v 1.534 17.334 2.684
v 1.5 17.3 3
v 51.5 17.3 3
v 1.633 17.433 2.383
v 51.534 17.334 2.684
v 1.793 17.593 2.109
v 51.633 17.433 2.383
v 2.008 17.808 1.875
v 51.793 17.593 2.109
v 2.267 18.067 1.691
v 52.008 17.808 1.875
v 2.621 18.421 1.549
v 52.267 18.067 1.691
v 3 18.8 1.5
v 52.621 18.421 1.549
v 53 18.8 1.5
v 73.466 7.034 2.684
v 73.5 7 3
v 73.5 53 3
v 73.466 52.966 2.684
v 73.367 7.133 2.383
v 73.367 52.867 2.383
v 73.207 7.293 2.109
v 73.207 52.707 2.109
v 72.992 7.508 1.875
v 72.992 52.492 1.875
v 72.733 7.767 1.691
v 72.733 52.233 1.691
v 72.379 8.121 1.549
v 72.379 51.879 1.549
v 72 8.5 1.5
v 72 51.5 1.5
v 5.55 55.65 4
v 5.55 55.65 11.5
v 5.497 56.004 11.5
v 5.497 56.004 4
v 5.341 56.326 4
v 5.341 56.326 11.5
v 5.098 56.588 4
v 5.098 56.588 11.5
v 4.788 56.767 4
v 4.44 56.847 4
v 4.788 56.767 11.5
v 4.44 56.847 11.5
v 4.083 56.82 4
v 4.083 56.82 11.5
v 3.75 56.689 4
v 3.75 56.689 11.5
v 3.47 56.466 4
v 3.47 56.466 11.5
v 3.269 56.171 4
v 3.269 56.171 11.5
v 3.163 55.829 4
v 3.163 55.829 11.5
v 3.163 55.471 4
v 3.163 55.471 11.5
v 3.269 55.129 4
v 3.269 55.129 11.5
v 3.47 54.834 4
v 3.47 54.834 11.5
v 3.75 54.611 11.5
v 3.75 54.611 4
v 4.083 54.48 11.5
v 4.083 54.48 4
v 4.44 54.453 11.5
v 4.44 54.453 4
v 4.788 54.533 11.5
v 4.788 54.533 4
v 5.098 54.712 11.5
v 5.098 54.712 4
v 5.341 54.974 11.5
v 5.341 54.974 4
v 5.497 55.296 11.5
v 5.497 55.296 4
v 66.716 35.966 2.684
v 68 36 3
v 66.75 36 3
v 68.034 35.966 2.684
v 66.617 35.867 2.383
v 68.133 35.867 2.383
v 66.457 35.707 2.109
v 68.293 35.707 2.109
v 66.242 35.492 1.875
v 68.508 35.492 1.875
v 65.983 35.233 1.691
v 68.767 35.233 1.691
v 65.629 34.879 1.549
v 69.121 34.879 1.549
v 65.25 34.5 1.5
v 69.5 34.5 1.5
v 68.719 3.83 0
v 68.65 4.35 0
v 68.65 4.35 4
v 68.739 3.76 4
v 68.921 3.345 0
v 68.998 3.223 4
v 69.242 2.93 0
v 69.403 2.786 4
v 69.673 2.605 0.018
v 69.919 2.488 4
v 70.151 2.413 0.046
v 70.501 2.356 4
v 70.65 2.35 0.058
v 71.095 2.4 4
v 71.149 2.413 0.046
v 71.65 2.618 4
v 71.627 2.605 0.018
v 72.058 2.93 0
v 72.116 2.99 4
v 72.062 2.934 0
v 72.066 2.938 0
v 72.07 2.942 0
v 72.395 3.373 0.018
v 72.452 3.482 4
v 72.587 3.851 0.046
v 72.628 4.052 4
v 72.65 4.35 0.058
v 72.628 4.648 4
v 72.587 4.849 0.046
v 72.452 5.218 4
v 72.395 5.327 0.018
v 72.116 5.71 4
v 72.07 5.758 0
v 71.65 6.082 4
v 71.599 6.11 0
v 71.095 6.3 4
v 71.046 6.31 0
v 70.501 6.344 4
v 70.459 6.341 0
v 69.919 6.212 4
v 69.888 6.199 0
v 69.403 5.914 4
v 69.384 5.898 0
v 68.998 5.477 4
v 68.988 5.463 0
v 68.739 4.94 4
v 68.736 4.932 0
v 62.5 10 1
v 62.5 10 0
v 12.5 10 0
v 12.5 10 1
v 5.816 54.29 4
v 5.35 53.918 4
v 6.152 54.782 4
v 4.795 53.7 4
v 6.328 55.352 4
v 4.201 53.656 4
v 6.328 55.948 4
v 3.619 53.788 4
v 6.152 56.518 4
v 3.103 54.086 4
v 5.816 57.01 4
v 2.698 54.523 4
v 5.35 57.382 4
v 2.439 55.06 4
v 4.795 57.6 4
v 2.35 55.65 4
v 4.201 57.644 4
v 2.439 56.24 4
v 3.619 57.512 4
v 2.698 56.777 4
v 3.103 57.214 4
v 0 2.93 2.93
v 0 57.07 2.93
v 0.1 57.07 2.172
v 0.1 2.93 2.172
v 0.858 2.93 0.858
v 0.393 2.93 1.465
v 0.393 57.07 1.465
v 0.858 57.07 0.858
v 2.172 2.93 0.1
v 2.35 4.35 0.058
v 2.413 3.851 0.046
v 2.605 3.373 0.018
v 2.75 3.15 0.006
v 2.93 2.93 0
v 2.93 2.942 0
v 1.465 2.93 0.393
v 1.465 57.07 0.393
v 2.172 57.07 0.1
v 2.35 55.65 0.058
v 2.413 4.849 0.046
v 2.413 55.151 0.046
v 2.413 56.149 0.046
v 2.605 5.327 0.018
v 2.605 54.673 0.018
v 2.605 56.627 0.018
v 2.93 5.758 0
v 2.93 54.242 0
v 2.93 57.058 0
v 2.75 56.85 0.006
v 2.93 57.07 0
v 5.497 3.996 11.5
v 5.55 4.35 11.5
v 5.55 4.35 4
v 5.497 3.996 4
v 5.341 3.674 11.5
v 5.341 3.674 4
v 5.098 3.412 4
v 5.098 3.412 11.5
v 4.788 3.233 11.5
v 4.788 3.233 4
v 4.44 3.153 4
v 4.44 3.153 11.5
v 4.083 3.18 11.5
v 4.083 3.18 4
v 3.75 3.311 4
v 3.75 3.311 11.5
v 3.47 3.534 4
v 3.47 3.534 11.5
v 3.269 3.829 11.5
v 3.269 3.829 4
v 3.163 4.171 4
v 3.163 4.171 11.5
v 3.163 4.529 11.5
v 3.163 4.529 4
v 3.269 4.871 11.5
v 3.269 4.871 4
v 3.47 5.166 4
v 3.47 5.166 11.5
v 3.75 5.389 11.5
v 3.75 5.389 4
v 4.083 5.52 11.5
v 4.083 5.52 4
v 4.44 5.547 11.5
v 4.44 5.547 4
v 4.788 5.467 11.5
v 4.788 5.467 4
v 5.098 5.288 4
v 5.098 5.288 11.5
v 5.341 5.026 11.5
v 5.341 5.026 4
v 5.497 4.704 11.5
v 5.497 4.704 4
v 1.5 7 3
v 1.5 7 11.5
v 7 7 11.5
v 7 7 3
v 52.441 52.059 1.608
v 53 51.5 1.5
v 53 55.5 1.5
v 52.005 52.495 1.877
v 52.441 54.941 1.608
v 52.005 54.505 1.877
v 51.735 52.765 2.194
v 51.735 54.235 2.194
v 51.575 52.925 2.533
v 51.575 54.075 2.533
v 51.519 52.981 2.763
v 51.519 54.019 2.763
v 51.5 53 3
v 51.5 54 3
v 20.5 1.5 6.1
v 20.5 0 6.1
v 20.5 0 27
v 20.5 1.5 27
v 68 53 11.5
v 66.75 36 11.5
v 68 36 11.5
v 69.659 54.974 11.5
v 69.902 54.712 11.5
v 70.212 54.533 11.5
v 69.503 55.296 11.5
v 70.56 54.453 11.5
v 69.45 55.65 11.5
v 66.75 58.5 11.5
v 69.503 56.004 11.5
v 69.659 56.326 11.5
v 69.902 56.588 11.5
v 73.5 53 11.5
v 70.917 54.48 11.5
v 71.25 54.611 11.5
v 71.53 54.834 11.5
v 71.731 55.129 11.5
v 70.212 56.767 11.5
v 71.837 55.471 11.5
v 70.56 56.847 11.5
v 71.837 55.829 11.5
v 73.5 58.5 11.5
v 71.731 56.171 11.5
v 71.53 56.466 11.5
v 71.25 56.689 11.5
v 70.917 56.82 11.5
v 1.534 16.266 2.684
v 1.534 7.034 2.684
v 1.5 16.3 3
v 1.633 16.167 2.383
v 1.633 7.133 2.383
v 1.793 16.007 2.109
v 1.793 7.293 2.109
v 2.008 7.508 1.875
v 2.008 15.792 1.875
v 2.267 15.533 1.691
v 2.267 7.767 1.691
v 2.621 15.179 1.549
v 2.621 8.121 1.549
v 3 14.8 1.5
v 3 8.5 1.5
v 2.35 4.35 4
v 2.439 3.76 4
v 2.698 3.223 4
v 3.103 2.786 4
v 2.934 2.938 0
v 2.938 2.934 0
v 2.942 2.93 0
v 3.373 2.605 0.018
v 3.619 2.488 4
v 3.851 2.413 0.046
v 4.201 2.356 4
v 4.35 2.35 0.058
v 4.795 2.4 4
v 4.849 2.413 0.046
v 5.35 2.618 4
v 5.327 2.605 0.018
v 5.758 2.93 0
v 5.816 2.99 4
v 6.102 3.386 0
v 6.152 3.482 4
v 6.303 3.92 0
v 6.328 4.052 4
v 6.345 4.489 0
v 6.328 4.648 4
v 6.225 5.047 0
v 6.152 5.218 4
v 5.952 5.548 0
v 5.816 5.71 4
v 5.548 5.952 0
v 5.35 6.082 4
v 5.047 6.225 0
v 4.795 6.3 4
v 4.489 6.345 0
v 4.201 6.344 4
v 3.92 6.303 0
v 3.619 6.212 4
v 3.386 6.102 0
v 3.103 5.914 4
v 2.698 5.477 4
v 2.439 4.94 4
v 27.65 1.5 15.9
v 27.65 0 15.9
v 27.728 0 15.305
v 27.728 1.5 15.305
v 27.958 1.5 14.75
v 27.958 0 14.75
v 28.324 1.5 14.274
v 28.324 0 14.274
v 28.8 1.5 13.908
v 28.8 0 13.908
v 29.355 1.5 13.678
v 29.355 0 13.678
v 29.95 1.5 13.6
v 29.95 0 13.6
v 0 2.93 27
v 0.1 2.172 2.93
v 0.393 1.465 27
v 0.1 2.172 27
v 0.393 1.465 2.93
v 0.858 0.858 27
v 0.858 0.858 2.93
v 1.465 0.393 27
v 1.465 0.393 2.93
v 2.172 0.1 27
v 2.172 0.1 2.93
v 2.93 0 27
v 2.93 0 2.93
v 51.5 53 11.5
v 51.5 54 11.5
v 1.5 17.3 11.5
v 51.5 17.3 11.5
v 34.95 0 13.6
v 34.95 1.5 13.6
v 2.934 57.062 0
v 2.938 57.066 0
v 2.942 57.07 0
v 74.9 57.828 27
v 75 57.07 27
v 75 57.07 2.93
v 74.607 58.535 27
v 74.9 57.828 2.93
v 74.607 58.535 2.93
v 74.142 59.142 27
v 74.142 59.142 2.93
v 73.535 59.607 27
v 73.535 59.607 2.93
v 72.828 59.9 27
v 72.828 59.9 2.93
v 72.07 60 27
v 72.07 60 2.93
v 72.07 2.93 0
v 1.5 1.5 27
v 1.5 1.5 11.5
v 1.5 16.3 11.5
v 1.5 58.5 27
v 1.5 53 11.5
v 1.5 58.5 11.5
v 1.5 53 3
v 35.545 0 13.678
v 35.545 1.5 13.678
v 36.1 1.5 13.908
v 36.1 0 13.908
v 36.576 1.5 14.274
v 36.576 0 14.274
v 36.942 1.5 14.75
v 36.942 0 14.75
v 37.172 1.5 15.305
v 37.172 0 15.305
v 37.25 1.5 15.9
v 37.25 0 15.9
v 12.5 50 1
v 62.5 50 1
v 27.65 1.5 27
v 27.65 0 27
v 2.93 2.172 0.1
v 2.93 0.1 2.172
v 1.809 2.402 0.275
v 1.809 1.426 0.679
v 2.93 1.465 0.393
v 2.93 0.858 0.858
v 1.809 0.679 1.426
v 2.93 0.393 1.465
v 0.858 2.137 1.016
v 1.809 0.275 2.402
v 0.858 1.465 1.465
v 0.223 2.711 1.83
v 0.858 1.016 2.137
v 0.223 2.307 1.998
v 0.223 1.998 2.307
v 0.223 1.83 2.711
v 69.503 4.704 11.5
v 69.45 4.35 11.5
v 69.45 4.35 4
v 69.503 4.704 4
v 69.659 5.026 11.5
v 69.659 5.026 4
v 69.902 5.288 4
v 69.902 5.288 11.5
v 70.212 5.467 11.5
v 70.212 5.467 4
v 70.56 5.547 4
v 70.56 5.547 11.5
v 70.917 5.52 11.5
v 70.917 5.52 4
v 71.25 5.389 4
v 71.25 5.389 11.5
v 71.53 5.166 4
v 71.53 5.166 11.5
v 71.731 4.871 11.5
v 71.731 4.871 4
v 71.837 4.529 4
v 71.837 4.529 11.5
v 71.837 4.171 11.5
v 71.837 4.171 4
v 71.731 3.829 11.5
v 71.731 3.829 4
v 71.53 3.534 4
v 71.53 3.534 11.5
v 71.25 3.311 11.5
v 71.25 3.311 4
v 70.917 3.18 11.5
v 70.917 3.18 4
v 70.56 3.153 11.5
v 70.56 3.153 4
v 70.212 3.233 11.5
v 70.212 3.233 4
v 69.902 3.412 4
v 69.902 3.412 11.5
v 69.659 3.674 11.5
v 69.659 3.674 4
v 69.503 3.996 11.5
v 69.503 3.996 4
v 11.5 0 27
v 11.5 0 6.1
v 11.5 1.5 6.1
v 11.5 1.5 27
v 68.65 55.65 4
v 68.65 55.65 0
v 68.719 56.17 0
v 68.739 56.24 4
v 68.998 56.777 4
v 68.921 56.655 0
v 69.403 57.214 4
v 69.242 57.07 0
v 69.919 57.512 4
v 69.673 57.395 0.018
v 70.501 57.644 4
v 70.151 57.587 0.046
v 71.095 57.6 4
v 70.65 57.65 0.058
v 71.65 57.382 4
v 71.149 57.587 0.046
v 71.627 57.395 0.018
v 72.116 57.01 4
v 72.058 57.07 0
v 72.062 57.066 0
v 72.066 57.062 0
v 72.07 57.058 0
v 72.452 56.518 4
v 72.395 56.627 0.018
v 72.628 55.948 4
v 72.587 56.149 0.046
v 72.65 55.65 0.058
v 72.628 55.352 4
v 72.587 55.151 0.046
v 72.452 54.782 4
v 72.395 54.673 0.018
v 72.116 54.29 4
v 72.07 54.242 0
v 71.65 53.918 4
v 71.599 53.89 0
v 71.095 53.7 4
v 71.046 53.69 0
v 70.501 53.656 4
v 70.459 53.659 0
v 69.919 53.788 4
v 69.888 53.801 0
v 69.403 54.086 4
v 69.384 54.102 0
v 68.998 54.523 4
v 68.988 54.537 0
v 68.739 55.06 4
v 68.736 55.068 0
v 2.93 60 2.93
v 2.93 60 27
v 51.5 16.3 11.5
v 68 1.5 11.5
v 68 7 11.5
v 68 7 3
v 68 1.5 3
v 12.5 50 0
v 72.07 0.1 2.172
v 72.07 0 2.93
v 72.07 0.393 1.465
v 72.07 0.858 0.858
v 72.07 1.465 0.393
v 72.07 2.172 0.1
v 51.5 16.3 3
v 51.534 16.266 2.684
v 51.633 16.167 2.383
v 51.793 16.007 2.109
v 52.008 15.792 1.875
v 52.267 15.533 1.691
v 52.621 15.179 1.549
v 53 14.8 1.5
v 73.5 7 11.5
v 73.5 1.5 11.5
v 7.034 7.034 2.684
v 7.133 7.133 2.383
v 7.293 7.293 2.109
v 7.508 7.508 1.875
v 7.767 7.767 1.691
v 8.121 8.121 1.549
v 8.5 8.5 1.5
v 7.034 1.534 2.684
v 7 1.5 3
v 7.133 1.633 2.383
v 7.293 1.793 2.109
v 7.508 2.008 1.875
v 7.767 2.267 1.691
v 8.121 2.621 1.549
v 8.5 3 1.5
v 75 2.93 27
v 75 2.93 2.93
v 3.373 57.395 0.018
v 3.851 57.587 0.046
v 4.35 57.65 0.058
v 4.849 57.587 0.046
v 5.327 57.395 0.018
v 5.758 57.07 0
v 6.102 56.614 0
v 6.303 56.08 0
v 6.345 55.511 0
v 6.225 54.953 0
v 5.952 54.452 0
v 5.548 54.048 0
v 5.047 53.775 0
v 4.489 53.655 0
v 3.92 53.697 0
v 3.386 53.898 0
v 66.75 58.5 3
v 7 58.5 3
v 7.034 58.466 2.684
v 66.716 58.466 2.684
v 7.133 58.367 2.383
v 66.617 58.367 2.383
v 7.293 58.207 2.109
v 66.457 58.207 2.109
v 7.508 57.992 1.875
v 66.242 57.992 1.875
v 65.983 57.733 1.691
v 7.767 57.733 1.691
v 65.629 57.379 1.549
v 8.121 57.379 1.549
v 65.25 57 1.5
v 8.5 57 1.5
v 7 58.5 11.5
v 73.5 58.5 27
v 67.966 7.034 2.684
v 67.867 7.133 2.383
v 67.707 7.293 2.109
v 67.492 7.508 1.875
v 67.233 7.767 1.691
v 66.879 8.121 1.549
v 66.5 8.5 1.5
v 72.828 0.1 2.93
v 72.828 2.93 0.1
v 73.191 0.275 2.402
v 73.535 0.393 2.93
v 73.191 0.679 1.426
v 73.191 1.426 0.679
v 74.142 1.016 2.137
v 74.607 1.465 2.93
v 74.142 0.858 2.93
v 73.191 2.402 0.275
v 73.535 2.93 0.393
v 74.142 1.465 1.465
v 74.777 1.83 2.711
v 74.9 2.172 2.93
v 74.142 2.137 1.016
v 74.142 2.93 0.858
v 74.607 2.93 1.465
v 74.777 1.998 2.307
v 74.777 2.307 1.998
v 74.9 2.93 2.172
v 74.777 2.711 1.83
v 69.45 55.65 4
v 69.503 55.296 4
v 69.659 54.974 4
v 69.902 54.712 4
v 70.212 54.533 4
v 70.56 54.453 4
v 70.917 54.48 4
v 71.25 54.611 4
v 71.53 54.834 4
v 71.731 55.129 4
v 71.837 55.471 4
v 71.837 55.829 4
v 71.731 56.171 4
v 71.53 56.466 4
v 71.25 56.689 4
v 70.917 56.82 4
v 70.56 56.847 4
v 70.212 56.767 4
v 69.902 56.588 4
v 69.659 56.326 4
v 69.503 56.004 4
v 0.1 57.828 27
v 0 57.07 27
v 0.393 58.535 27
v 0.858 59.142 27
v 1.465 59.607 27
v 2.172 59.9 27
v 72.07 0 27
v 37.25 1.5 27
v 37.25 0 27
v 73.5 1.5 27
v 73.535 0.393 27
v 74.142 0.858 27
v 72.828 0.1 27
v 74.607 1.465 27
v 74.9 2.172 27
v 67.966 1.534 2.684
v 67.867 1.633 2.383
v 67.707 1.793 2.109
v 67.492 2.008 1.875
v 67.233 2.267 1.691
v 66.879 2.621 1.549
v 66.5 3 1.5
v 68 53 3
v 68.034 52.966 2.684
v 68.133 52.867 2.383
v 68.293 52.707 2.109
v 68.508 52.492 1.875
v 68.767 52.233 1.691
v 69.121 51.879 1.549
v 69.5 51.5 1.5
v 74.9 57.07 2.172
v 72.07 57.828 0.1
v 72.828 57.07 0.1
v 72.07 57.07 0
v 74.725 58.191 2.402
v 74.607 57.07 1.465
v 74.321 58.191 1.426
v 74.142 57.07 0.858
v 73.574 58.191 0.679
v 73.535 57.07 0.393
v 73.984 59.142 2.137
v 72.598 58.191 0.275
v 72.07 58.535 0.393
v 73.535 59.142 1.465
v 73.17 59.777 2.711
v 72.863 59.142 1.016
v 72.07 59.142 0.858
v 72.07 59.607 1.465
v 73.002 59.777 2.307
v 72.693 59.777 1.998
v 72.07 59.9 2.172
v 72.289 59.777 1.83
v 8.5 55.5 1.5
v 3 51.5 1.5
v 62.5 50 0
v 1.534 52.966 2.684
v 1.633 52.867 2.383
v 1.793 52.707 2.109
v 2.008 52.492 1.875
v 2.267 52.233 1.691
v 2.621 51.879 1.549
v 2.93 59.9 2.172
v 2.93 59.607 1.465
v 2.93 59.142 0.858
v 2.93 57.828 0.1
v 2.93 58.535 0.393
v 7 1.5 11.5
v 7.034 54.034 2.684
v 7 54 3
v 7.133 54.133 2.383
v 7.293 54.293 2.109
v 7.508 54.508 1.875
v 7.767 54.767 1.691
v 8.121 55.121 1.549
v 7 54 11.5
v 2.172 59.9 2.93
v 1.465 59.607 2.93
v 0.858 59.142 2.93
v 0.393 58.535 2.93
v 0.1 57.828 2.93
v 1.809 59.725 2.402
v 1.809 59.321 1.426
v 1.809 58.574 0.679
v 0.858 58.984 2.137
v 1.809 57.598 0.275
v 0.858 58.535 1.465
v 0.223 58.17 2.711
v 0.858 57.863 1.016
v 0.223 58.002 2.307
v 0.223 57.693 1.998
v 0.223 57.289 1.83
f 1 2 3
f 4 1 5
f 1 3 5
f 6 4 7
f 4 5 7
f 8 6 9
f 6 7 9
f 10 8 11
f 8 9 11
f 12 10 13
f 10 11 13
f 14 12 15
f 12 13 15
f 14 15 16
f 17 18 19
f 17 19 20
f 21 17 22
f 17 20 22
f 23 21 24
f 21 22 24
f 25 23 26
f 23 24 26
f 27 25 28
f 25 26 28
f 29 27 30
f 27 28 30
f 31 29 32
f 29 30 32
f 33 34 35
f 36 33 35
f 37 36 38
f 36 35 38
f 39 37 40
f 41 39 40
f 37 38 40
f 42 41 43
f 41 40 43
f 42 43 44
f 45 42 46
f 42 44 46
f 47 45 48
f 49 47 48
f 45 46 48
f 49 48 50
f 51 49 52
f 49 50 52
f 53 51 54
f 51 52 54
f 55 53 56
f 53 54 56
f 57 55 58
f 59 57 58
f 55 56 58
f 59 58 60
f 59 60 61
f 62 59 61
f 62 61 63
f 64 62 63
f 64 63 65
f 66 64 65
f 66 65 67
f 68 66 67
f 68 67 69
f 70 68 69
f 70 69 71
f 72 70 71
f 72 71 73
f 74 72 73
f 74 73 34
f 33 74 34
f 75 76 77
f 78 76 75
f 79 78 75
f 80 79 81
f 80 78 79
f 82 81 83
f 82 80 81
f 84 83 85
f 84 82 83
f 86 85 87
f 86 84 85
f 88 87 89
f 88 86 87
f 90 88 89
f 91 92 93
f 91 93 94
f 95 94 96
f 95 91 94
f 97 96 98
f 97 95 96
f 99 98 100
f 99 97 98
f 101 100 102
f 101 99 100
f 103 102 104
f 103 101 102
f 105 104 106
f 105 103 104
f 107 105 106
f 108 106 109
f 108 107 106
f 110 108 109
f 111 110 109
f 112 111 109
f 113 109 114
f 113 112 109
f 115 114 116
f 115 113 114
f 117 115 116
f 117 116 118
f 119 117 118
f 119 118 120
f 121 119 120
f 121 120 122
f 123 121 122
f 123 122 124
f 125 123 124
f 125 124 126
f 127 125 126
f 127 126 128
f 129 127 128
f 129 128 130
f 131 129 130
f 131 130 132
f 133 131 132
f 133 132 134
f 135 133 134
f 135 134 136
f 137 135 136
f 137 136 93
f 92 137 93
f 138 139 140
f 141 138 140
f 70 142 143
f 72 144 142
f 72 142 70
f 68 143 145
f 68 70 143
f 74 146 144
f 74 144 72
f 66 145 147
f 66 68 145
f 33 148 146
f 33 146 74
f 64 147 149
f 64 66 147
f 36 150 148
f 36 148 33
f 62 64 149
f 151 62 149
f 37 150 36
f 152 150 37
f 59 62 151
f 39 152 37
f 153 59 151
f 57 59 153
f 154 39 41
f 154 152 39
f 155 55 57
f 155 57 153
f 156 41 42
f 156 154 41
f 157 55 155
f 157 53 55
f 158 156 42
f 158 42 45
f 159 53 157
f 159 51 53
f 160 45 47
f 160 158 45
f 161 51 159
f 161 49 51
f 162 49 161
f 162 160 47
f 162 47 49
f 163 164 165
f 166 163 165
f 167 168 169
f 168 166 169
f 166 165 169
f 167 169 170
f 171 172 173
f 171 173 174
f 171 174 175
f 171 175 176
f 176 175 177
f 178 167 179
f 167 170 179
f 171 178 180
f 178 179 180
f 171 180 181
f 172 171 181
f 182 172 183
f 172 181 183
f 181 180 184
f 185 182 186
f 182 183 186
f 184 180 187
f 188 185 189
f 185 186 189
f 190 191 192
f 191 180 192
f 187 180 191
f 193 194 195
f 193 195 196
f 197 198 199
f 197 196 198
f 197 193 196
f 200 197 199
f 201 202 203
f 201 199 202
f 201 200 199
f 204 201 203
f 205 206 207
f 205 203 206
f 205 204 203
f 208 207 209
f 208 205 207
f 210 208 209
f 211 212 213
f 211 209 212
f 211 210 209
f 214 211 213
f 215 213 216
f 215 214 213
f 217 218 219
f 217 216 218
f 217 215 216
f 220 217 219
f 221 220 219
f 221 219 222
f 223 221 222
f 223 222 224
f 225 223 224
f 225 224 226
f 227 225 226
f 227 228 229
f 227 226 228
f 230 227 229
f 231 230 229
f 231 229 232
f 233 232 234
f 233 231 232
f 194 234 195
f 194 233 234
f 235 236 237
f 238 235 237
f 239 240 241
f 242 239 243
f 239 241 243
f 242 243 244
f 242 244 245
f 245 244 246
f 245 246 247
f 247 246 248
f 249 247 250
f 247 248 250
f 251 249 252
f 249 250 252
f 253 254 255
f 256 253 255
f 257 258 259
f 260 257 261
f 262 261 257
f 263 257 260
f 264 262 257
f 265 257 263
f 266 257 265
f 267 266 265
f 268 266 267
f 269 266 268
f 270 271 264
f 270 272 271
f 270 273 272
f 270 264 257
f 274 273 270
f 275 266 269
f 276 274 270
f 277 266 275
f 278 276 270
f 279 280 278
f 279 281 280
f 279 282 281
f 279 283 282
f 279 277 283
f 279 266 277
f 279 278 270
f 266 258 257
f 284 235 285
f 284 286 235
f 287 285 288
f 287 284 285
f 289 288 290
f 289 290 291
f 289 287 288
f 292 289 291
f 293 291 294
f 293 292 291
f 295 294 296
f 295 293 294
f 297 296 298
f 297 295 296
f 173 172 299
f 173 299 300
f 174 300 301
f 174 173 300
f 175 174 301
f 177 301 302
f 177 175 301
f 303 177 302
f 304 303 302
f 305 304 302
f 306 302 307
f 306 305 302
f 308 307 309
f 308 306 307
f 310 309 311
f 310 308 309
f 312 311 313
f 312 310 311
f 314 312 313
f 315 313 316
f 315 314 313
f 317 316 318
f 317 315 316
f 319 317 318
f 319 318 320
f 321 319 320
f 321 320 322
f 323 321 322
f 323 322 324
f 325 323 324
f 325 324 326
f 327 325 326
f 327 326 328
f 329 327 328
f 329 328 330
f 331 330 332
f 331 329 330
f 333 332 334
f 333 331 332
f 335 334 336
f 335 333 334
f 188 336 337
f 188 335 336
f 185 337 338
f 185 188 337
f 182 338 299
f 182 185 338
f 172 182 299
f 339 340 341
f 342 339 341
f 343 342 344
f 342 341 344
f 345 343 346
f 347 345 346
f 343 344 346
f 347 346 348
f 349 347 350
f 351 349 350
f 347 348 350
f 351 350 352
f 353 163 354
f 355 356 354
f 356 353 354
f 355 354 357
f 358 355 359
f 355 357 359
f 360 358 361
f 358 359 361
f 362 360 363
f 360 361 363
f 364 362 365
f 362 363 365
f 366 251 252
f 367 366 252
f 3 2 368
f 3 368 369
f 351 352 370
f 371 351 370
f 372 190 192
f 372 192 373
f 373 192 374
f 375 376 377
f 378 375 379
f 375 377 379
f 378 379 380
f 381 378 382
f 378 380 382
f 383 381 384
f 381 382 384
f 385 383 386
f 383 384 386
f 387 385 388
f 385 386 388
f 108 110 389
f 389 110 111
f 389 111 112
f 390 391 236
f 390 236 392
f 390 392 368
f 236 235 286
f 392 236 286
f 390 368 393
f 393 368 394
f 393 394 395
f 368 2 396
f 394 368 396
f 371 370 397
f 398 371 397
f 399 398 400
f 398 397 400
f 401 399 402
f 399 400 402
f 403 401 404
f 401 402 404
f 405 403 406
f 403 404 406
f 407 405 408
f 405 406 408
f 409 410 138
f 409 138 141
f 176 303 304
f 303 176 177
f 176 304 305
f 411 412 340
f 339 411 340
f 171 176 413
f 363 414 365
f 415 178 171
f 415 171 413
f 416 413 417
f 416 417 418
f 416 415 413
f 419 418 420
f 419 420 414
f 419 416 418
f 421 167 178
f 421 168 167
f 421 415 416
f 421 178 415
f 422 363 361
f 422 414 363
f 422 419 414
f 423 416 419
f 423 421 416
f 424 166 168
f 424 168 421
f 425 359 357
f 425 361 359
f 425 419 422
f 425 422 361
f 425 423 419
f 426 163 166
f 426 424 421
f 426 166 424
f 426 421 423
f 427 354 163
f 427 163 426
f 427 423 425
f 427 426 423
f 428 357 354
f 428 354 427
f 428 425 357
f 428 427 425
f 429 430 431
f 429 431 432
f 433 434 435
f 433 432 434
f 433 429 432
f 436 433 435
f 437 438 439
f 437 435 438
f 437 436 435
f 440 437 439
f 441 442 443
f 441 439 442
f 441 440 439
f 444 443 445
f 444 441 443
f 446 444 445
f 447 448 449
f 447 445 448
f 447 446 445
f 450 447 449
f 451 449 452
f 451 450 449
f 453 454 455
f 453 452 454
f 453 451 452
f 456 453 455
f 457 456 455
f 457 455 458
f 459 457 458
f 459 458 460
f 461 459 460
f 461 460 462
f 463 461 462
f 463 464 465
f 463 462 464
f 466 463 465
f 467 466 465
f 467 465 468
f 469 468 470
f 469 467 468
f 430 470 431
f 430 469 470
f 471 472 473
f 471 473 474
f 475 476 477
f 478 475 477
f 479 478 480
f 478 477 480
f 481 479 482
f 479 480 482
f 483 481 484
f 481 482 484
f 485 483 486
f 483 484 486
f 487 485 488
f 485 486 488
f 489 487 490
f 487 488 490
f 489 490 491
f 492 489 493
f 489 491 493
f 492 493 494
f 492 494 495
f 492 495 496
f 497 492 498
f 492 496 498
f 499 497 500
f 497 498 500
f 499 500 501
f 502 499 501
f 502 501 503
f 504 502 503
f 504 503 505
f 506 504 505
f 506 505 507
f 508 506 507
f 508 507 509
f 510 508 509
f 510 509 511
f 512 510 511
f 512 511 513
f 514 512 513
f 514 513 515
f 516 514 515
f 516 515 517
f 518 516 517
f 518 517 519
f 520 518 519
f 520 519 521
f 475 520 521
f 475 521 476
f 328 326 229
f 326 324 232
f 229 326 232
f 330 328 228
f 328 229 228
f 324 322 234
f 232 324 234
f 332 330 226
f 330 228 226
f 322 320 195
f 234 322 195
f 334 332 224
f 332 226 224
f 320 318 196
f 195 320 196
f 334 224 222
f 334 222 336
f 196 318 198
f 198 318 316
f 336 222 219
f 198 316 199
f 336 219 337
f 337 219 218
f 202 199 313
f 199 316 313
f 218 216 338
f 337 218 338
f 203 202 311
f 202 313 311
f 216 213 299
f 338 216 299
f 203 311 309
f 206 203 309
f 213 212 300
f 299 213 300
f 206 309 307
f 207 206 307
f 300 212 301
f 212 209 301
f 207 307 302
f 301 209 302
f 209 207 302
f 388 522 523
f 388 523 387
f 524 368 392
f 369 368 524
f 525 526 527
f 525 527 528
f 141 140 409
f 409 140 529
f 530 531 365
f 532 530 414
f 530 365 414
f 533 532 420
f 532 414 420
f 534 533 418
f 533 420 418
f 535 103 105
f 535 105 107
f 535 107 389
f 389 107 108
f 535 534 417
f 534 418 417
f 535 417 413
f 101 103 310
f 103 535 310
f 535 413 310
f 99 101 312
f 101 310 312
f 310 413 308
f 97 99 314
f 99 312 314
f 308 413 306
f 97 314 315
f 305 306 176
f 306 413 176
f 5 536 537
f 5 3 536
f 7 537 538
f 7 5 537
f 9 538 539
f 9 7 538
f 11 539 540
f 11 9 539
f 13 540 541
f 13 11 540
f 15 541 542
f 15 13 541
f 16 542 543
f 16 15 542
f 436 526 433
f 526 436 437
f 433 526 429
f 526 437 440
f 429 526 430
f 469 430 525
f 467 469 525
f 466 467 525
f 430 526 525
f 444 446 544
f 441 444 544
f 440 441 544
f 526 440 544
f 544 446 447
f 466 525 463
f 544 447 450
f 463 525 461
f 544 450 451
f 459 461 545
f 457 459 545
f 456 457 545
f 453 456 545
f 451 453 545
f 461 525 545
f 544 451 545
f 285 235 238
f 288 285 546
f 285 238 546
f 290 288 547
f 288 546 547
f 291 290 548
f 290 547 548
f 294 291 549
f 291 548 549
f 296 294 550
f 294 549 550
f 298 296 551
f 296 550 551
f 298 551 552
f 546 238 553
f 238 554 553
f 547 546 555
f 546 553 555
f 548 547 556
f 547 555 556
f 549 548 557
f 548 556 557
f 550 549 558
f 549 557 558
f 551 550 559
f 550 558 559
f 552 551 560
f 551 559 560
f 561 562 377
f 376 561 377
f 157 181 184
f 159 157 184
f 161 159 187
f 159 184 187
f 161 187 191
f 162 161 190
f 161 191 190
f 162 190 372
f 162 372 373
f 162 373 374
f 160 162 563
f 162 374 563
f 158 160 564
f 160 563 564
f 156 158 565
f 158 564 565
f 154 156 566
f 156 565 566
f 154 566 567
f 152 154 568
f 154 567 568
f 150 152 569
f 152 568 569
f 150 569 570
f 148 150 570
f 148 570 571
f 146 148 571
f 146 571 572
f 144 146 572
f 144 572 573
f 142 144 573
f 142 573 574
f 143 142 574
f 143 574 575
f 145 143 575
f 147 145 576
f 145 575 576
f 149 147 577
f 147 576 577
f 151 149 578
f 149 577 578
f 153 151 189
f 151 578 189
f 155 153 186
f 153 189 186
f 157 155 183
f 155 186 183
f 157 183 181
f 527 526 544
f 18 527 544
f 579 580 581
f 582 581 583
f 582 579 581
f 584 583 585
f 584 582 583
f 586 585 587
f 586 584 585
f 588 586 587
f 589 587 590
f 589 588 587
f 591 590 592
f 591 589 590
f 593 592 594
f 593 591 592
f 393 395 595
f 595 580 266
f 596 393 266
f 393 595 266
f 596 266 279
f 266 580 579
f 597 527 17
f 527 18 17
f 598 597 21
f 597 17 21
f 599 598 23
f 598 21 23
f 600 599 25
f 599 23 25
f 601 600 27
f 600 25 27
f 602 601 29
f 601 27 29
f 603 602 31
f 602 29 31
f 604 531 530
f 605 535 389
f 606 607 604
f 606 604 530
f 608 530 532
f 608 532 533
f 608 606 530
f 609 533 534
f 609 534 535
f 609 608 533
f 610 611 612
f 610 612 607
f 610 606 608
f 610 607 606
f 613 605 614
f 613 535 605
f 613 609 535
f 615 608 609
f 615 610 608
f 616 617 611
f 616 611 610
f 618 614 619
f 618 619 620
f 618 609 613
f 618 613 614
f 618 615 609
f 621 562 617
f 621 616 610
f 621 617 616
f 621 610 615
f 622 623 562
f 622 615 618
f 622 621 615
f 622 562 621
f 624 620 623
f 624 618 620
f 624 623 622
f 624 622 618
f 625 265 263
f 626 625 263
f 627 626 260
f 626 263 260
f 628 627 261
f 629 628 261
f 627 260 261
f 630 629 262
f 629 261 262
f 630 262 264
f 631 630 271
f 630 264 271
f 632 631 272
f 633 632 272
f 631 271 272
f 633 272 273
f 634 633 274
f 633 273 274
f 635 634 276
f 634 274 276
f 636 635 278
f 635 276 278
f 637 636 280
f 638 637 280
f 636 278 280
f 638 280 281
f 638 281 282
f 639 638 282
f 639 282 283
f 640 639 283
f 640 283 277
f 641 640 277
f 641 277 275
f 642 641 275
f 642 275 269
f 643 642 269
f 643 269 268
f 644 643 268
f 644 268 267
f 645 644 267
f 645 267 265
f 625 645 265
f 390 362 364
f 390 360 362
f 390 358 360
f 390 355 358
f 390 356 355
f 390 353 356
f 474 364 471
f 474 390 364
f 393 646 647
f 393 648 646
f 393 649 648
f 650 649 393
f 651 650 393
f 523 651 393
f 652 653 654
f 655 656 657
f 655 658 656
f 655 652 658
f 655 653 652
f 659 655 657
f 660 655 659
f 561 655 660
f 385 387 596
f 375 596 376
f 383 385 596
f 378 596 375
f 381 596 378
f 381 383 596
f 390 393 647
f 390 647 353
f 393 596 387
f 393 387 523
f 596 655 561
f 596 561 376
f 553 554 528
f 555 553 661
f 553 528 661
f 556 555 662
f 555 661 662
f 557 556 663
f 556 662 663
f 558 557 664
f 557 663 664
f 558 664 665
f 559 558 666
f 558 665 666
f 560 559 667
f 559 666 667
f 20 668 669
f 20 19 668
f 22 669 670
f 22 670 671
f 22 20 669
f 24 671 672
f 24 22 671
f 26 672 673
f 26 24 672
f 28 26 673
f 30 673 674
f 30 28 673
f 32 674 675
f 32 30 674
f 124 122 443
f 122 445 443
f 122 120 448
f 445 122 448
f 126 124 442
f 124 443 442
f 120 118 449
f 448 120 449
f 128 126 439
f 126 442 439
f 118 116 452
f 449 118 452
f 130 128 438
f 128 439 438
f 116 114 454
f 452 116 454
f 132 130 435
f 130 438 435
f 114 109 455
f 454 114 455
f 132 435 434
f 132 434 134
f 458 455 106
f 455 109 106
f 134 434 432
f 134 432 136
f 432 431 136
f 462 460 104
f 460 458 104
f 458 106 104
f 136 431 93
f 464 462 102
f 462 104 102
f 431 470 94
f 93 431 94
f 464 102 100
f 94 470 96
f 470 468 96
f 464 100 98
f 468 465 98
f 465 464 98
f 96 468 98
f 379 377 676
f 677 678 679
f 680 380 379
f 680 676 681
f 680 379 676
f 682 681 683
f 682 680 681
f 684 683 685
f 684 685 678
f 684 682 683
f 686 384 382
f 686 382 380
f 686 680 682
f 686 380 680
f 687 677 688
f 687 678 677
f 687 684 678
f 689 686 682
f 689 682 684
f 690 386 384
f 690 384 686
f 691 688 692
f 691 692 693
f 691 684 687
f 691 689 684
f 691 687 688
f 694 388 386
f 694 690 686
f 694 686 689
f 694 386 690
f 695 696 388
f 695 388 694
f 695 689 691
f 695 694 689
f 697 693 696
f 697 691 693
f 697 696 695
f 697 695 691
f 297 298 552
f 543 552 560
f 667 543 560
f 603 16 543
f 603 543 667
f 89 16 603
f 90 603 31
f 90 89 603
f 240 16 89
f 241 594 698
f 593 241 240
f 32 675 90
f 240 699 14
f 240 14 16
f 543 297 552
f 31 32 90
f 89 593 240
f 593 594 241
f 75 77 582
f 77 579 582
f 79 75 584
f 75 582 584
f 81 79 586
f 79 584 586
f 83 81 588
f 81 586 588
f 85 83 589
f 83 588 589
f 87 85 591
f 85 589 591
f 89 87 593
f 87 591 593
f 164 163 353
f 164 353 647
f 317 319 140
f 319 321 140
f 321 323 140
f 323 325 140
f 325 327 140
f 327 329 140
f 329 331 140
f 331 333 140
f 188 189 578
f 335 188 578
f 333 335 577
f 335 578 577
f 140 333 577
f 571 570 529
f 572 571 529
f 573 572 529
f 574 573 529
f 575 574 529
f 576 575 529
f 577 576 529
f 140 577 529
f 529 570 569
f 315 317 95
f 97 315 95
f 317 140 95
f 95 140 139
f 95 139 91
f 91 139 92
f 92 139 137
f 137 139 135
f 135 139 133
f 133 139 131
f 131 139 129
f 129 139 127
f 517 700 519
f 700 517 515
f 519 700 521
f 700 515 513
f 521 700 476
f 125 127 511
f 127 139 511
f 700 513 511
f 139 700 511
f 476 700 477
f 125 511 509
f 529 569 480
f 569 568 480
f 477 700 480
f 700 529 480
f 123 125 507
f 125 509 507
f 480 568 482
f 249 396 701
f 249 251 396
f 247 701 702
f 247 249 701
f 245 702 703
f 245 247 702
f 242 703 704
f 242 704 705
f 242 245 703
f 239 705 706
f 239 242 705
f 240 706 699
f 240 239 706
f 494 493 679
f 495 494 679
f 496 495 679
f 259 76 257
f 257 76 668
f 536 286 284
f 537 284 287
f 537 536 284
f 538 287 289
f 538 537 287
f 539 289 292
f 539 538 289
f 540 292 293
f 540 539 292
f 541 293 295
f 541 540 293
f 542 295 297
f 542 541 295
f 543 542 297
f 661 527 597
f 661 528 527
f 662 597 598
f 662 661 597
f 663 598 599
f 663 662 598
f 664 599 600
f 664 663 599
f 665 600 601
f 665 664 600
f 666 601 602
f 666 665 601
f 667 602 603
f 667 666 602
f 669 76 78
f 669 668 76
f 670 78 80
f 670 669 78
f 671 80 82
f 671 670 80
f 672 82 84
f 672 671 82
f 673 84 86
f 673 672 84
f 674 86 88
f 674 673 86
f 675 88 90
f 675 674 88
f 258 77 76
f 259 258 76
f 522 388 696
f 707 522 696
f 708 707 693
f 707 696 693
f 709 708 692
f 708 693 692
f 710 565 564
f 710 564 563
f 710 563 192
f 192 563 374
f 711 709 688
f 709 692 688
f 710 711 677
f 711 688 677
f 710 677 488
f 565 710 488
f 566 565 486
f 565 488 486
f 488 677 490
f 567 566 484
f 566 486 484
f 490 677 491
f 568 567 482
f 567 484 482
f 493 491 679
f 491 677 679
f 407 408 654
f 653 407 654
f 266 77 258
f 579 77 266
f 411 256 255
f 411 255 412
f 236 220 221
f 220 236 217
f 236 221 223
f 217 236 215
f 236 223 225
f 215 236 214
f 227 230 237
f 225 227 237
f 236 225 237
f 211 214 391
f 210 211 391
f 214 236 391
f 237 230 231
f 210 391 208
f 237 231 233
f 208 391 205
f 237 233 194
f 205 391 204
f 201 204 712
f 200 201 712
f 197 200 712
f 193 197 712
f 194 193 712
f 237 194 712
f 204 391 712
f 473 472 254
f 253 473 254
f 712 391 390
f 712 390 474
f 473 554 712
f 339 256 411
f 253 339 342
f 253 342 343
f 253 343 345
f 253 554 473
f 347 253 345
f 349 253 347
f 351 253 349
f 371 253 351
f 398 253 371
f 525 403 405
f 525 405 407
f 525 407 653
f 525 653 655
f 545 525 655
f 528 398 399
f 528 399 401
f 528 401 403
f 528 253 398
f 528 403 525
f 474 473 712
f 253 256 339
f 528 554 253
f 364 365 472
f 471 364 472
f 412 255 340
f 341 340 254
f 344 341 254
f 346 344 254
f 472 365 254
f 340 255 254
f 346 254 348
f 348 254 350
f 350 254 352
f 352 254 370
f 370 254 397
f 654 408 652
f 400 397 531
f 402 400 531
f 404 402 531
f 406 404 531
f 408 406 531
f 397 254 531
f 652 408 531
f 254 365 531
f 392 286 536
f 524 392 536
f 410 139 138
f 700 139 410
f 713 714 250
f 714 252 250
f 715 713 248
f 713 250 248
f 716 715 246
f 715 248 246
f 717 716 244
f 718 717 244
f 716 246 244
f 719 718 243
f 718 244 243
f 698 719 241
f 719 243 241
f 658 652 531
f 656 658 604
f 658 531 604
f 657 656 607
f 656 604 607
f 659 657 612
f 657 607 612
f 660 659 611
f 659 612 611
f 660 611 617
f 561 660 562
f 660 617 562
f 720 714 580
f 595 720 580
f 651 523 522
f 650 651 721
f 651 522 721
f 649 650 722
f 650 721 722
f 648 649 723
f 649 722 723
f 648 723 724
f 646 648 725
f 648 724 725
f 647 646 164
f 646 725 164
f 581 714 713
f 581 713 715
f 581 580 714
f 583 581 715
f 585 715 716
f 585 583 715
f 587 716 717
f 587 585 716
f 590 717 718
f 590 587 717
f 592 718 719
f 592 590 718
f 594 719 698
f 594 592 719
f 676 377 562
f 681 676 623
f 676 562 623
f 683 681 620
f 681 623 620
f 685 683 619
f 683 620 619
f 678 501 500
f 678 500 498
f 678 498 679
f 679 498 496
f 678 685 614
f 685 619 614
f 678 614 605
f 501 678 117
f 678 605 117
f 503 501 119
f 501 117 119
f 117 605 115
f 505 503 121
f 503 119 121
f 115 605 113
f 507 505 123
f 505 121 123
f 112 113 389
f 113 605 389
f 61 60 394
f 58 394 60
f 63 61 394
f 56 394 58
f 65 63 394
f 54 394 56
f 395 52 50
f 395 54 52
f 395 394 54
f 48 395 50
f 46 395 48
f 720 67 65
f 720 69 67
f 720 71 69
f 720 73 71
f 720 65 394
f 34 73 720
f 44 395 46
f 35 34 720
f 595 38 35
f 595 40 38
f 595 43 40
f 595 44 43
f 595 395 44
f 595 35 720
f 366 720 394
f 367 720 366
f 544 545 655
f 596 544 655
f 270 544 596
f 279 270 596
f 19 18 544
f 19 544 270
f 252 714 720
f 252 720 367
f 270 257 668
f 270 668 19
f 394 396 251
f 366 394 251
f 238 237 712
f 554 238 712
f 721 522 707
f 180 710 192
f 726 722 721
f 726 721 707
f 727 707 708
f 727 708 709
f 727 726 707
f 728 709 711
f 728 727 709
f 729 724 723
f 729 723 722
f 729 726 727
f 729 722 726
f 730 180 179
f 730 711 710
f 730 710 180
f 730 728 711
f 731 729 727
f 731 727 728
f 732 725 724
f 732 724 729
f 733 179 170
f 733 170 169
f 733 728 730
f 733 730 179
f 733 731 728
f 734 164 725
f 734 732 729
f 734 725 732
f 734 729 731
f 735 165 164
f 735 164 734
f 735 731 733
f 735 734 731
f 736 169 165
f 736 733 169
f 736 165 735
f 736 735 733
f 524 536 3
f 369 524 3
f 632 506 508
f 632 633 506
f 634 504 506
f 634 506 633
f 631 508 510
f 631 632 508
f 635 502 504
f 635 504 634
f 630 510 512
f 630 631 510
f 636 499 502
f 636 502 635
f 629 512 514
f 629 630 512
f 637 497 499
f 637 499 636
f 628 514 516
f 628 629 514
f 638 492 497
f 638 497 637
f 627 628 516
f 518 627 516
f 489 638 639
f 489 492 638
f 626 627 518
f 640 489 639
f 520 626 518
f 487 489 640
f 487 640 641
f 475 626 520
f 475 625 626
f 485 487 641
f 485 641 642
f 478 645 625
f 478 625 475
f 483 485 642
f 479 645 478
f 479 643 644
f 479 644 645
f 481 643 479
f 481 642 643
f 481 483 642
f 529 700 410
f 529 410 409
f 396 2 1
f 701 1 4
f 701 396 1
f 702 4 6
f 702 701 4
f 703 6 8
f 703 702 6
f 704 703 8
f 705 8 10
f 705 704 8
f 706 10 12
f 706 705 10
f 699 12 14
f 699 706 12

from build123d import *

# Parameters (mm, degrees)
SKETCH2_W               = 75
SKETCH2_H               = 60
BODY_CREATION_DEPTH     = 27
THIKNESS_OF_WALLS_T     = -1.5
SKETCH6_W               = 5.5
SKETCH6_H               = 5.5
CORNER_RECT_DEPTH       = 10
SKETCH8_R               = 1.2
SCREW_HOLE_DEPTH        = 27
SKETCH10_R              = 2
SCREW_HEAD_DEPTH        = 4
SKETCH5_W               = 9
SKETCH5_H               = 20.9
PORTS_CUT_OUT_DEPTH     = 1.5
SKETCH11_W              = 44.5
SKETCH11_H              = 1
SKETCH11_W_2            = 50
SKETCH11_W_3            = 1.25
SKETCH11_H_2            = 22.5
BATTERY_PLACEMENT_DEPTH = 10
FILLET1_R               = 1.5
FILLET2_R               = 2.93
SKETCH13_W              = 50
SKETCH13_H              = 40
CUT_EXTRUDE1_DEPTH      = 1


with BuildPart() as part:
    # Sketch2 → Body creation (new body)
    with BuildSketch(Plane.XY):
        with Locations((37.5, 30)):
            Rectangle(SKETCH2_W, SKETCH2_H)
    extrude(amount=BODY_CREATION_DEPTH)

    # Thikness of walls
    thikness_of_walls_openings = [part.faces().sort_by_distance(p)[0] for p in [
        (37.5, 30, 27),
    ]]
    offset(amount=THIKNESS_OF_WALLS_T, openings=thikness_of_walls_openings, kind=Kind.INTERSECTION)

    # Sketch6 → Corner rect. (add)
    with BuildSketch(Plane.XY.offset(1.5)):
        with Locations((4.25, 55.75)):
            Rectangle(SKETCH6_W, SKETCH6_H)
        with Locations((70.75, 55.75)):
            Rectangle(SKETCH6_W, SKETCH6_H)
    corner_rect = extrude(amount=CORNER_RECT_DEPTH)

    # Sketch8 → Screw hole (cut)
    with BuildSketch(Plane.XY.offset(27)):
        with Locations((4.35, 55.65)):
            Circle(SKETCH8_R)
        with Locations(Location((70.65, 55.65, 0), (0, 0, 180))):
            Circle(SKETCH8_R)
    screw_hole = extrude(amount=-SCREW_HOLE_DEPTH, mode=Mode.SUBTRACT)

    # Sketch10 → Screw head (cut)
    with BuildSketch(Plane(origin=(0, 0, 0), x_dir=(-1, 0, 0), z_dir=(0, 0, -1))):
        with Locations((-70.65, 55.65)):
            Circle(SKETCH10_R)
        with Locations((-4.35, 55.65)):
            Circle(SKETCH10_R)
    screw_head = extrude(amount=-SCREW_HEAD_DEPTH, mode=Mode.SUBTRACT)

    # Mirror to other side: Corner rect., Screw hole, Screw head across plane
    add(corner_rect.mirror(Plane(origin=(0, 30, 0), x_dir=(0, 0, 1), z_dir=(0, -1, 0))))
    add(screw_hole.mirror(Plane(origin=(0, 30, 0), x_dir=(0, 0, 1), z_dir=(0, -1, 0))), mode=Mode.SUBTRACT)
    add(screw_head.mirror(Plane(origin=(0, 30, 0), x_dir=(0, 0, 1), z_dir=(0, -1, 0))), mode=Mode.SUBTRACT)

    # Sketch5 → Ports cut out (cut)
    with BuildSketch(Plane.XZ):
        with Locations((16, 16.55)):
            Rectangle(SKETCH5_W, SKETCH5_H)
        with BuildLine():
            Line((29.95, 13.6), (34.95, 13.6))
            ThreePointArc((34.95, 13.6), (36.576345597, 14.273654403), (37.25, 15.9))
            Line((37.25, 15.9), (37.25, 27))
            Line((37.25, 27), (27.65, 27))
            Line((27.65, 27), (27.65, 15.9))
            ThreePointArc((27.65, 15.9), (28.323654403, 14.273654403), (29.95, 13.6))
        make_face()
    extrude(amount=-PORTS_CUT_OUT_DEPTH, mode=Mode.SUBTRACT)

    # Sketch11 → Battery Placement (add)
    with BuildSketch(Plane.XY.offset(1.5)):
        with Locations((29.25, 53.5)):
            Rectangle(SKETCH11_W, SKETCH11_H)
        with Locations((26.5, 16.8)):
            Rectangle(SKETCH11_W_2, SKETCH11_H)
        with Locations((67.375, 47.25)):
            Rectangle(SKETCH11_W_3, SKETCH11_H_2)
    extrude(amount=BATTERY_PLACEMENT_DEPTH)

    # Fillet1
    fillet1_edges = [part.edges().sort_by_distance(p)[0] for p in [
        (7, 56.25, 1.5),
        (51.5, 53.5, 1.5),
        (29.25, 54, 1.5),
        (1.5, 11.65, 1.5),
        (51.5, 16.8, 1.5),
        (26.5, 17.3, 1.5),
        (26.5, 16.3, 1.5),
        (36.875, 58.5, 1.5),
        (68, 44.5, 1.5),
        (66.75, 47.25, 1.5),
        (67.375, 36, 1.5),
        (1.5, 35.15, 1.5),
        (26.5, 53, 1.5),
        (70.75, 53, 1.5),
        (37.5, 1.5, 1.5),
        (4.25, 7, 1.5),
        (7, 4.25, 1.5),
        (73.5, 30, 1.5),
        (68, 4.25, 1.5),
        (70.75, 7, 1.5),
    ]]
    fillet(fillet1_edges, radius=FILLET1_R)

    # Fillet2
    # the kernel refuses this fillet: 2.93 mm, written as the material it takes off along each edge
    with BuildSketch(Plane(origin=(72.07, 57.07, 2.93), x_dir=(1, 0, 0), z_dir=(0, 1, 0))) as fillet2_piece_1_section:
        Polygon((0, 0), (FILLET2_R, 0), (FILLET2_R, FILLET2_R), (0, FILLET2_R), align=None)
    fillet2_piece_1 = extrude(amount=FILLET2_R, mode=Mode.PRIVATE)
    fillet2_piece_1 = fillet2_piece_1 - Plane(origin=(72.07, 57.07, 2.93), x_dir=(-0.7071067811865475, 0, 0.7071067811865475), z_dir=(0, 1, 0)) * Sphere(FILLET2_R, mode=Mode.PRIVATE)
    add(fillet2_piece_1, mode=Mode.SUBTRACT)
    with BuildSketch(Plane(origin=(2.93, 57.07, 2.93), x_dir=(0, 1, 0), z_dir=(-1, 0, 0))) as fillet2_piece_2_section:
        Polygon((0, 0), (FILLET2_R, 0), (FILLET2_R, FILLET2_R), (0, FILLET2_R), align=None)
    fillet2_piece_2 = extrude(amount=FILLET2_R, mode=Mode.PRIVATE)
    fillet2_piece_2 = fillet2_piece_2 - Plane(origin=(2.93, 57.07, 2.93), x_dir=(0, -0.7071067811865475, 0.7071067811865475), z_dir=(-1, 0, 0)) * Sphere(FILLET2_R, mode=Mode.PRIVATE)
    add(fillet2_piece_2, mode=Mode.SUBTRACT)
    with BuildSketch(Plane(origin=(72.07, 2.93, 2.93), x_dir=(0, -1, 0), z_dir=(1, 0, 0))) as fillet2_piece_3_section:
        Polygon((0, 0), (FILLET2_R, 0), (FILLET2_R, FILLET2_R), (0, FILLET2_R), align=None)
    fillet2_piece_3 = extrude(amount=FILLET2_R, mode=Mode.PRIVATE)
    fillet2_piece_3 = fillet2_piece_3 - Plane(origin=(72.07, 2.93, 2.93), x_dir=(0, 0.7071067811865475, 0.7071067811865475), z_dir=(1, 0, 0)) * Sphere(FILLET2_R, mode=Mode.PRIVATE)
    add(fillet2_piece_3, mode=Mode.SUBTRACT)
    with BuildSketch(Plane(origin=(2.93, 2.93, 2.93), x_dir=(0, -1, 0), z_dir=(-1, 0, 0))) as fillet2_piece_4_section:
        Polygon((0, 0), (FILLET2_R, 0), (FILLET2_R, -FILLET2_R), (0, -FILLET2_R), align=None)
    fillet2_piece_4 = extrude(amount=FILLET2_R, mode=Mode.PRIVATE)
    fillet2_piece_4 = fillet2_piece_4 - Plane(origin=(2.93, 2.93, 2.93), x_dir=(0, 0.7071067811865475, 0.7071067811865475), z_dir=(-1, 0, 0)) * Sphere(FILLET2_R, mode=Mode.PRIVATE)
    add(fillet2_piece_4, mode=Mode.SUBTRACT)
    with BuildSketch(Plane(origin=(72.07, 60, 0), x_dir=(0, 0, 1), z_dir=(-1, 0, 0)), Plane(origin=(2.93, 0, 0), x_dir=(0, 0, 1), z_dir=(1, 0, 0))) as fillet2_piece_5:
        with BuildLine():
            CenterArc((FILLET2_R, -FILLET2_R), FILLET2_R, 90, 90)
            Line((0, -FILLET2_R), (0, 0))
            Line((0, 0), (FILLET2_R, 0))
        make_face()
    extrude(amount=69.14, mode=Mode.SUBTRACT)
    with BuildSketch(Plane(origin=(75, 2.93, 0), x_dir=(0, 0, 1), z_dir=(0, 1, 0)), Plane(origin=(0, 57.07, 0), x_dir=(0, 0, 1), z_dir=(0, -1, 0))) as fillet2_piece_6:
        with BuildLine():
            CenterArc((FILLET2_R, -FILLET2_R), FILLET2_R, 90, 90)
            Line((0, -FILLET2_R), (0, 0))
            Line((0, 0), (FILLET2_R, 0))
        make_face()
    extrude(amount=54.14, mode=Mode.SUBTRACT)
    with BuildSketch(Plane(origin=(0, 60, 2.93), x_dir=(0, -1, 0), z_dir=(0, 0, 1)), Plane(origin=(75, 60, 2.93), x_dir=(-1, 0, 0), z_dir=(0, 0, 1)), Plane(origin=(75, 0, 2.93), x_dir=(0, 1, 0), z_dir=(0, 0, 1))) as fillet2_piece_7:
        with BuildLine():
            CenterArc((FILLET2_R, FILLET2_R), FILLET2_R, 180, 90)
            Line((0, FILLET2_R), (0, 0))
            Line((0, 0), (FILLET2_R, 0))
        make_face()
    extrude(amount=31.395, mode=Mode.SUBTRACT)
    with BuildSketch(Plane(origin=(0, 0, 2.93), x_dir=(0, 1, 0), z_dir=(0, 0, 1))) as fillet2_piece_8:
        with BuildLine():
            CenterArc((FILLET2_R, -FILLET2_R), FILLET2_R, 90, 90)
            Line((0, -FILLET2_R), (0, 0))
            Line((0, 0), (FILLET2_R, 0))
        make_face()
    extrude(amount=31.395, mode=Mode.SUBTRACT)

    # Sketch13 → Cut-Extrude1 (cut)
    with BuildSketch(Plane(origin=(0, 0, 0), x_dir=(-1, 0, 0), z_dir=(0, 0, -1))):
        with Locations((-37.5, 30)):
            Rectangle(SKETCH13_W, SKETCH13_H)
    extrude(amount=-CUT_EXTRUDE1_DEPTH, mode=Mode.SUBTRACT)


solid = part.part
